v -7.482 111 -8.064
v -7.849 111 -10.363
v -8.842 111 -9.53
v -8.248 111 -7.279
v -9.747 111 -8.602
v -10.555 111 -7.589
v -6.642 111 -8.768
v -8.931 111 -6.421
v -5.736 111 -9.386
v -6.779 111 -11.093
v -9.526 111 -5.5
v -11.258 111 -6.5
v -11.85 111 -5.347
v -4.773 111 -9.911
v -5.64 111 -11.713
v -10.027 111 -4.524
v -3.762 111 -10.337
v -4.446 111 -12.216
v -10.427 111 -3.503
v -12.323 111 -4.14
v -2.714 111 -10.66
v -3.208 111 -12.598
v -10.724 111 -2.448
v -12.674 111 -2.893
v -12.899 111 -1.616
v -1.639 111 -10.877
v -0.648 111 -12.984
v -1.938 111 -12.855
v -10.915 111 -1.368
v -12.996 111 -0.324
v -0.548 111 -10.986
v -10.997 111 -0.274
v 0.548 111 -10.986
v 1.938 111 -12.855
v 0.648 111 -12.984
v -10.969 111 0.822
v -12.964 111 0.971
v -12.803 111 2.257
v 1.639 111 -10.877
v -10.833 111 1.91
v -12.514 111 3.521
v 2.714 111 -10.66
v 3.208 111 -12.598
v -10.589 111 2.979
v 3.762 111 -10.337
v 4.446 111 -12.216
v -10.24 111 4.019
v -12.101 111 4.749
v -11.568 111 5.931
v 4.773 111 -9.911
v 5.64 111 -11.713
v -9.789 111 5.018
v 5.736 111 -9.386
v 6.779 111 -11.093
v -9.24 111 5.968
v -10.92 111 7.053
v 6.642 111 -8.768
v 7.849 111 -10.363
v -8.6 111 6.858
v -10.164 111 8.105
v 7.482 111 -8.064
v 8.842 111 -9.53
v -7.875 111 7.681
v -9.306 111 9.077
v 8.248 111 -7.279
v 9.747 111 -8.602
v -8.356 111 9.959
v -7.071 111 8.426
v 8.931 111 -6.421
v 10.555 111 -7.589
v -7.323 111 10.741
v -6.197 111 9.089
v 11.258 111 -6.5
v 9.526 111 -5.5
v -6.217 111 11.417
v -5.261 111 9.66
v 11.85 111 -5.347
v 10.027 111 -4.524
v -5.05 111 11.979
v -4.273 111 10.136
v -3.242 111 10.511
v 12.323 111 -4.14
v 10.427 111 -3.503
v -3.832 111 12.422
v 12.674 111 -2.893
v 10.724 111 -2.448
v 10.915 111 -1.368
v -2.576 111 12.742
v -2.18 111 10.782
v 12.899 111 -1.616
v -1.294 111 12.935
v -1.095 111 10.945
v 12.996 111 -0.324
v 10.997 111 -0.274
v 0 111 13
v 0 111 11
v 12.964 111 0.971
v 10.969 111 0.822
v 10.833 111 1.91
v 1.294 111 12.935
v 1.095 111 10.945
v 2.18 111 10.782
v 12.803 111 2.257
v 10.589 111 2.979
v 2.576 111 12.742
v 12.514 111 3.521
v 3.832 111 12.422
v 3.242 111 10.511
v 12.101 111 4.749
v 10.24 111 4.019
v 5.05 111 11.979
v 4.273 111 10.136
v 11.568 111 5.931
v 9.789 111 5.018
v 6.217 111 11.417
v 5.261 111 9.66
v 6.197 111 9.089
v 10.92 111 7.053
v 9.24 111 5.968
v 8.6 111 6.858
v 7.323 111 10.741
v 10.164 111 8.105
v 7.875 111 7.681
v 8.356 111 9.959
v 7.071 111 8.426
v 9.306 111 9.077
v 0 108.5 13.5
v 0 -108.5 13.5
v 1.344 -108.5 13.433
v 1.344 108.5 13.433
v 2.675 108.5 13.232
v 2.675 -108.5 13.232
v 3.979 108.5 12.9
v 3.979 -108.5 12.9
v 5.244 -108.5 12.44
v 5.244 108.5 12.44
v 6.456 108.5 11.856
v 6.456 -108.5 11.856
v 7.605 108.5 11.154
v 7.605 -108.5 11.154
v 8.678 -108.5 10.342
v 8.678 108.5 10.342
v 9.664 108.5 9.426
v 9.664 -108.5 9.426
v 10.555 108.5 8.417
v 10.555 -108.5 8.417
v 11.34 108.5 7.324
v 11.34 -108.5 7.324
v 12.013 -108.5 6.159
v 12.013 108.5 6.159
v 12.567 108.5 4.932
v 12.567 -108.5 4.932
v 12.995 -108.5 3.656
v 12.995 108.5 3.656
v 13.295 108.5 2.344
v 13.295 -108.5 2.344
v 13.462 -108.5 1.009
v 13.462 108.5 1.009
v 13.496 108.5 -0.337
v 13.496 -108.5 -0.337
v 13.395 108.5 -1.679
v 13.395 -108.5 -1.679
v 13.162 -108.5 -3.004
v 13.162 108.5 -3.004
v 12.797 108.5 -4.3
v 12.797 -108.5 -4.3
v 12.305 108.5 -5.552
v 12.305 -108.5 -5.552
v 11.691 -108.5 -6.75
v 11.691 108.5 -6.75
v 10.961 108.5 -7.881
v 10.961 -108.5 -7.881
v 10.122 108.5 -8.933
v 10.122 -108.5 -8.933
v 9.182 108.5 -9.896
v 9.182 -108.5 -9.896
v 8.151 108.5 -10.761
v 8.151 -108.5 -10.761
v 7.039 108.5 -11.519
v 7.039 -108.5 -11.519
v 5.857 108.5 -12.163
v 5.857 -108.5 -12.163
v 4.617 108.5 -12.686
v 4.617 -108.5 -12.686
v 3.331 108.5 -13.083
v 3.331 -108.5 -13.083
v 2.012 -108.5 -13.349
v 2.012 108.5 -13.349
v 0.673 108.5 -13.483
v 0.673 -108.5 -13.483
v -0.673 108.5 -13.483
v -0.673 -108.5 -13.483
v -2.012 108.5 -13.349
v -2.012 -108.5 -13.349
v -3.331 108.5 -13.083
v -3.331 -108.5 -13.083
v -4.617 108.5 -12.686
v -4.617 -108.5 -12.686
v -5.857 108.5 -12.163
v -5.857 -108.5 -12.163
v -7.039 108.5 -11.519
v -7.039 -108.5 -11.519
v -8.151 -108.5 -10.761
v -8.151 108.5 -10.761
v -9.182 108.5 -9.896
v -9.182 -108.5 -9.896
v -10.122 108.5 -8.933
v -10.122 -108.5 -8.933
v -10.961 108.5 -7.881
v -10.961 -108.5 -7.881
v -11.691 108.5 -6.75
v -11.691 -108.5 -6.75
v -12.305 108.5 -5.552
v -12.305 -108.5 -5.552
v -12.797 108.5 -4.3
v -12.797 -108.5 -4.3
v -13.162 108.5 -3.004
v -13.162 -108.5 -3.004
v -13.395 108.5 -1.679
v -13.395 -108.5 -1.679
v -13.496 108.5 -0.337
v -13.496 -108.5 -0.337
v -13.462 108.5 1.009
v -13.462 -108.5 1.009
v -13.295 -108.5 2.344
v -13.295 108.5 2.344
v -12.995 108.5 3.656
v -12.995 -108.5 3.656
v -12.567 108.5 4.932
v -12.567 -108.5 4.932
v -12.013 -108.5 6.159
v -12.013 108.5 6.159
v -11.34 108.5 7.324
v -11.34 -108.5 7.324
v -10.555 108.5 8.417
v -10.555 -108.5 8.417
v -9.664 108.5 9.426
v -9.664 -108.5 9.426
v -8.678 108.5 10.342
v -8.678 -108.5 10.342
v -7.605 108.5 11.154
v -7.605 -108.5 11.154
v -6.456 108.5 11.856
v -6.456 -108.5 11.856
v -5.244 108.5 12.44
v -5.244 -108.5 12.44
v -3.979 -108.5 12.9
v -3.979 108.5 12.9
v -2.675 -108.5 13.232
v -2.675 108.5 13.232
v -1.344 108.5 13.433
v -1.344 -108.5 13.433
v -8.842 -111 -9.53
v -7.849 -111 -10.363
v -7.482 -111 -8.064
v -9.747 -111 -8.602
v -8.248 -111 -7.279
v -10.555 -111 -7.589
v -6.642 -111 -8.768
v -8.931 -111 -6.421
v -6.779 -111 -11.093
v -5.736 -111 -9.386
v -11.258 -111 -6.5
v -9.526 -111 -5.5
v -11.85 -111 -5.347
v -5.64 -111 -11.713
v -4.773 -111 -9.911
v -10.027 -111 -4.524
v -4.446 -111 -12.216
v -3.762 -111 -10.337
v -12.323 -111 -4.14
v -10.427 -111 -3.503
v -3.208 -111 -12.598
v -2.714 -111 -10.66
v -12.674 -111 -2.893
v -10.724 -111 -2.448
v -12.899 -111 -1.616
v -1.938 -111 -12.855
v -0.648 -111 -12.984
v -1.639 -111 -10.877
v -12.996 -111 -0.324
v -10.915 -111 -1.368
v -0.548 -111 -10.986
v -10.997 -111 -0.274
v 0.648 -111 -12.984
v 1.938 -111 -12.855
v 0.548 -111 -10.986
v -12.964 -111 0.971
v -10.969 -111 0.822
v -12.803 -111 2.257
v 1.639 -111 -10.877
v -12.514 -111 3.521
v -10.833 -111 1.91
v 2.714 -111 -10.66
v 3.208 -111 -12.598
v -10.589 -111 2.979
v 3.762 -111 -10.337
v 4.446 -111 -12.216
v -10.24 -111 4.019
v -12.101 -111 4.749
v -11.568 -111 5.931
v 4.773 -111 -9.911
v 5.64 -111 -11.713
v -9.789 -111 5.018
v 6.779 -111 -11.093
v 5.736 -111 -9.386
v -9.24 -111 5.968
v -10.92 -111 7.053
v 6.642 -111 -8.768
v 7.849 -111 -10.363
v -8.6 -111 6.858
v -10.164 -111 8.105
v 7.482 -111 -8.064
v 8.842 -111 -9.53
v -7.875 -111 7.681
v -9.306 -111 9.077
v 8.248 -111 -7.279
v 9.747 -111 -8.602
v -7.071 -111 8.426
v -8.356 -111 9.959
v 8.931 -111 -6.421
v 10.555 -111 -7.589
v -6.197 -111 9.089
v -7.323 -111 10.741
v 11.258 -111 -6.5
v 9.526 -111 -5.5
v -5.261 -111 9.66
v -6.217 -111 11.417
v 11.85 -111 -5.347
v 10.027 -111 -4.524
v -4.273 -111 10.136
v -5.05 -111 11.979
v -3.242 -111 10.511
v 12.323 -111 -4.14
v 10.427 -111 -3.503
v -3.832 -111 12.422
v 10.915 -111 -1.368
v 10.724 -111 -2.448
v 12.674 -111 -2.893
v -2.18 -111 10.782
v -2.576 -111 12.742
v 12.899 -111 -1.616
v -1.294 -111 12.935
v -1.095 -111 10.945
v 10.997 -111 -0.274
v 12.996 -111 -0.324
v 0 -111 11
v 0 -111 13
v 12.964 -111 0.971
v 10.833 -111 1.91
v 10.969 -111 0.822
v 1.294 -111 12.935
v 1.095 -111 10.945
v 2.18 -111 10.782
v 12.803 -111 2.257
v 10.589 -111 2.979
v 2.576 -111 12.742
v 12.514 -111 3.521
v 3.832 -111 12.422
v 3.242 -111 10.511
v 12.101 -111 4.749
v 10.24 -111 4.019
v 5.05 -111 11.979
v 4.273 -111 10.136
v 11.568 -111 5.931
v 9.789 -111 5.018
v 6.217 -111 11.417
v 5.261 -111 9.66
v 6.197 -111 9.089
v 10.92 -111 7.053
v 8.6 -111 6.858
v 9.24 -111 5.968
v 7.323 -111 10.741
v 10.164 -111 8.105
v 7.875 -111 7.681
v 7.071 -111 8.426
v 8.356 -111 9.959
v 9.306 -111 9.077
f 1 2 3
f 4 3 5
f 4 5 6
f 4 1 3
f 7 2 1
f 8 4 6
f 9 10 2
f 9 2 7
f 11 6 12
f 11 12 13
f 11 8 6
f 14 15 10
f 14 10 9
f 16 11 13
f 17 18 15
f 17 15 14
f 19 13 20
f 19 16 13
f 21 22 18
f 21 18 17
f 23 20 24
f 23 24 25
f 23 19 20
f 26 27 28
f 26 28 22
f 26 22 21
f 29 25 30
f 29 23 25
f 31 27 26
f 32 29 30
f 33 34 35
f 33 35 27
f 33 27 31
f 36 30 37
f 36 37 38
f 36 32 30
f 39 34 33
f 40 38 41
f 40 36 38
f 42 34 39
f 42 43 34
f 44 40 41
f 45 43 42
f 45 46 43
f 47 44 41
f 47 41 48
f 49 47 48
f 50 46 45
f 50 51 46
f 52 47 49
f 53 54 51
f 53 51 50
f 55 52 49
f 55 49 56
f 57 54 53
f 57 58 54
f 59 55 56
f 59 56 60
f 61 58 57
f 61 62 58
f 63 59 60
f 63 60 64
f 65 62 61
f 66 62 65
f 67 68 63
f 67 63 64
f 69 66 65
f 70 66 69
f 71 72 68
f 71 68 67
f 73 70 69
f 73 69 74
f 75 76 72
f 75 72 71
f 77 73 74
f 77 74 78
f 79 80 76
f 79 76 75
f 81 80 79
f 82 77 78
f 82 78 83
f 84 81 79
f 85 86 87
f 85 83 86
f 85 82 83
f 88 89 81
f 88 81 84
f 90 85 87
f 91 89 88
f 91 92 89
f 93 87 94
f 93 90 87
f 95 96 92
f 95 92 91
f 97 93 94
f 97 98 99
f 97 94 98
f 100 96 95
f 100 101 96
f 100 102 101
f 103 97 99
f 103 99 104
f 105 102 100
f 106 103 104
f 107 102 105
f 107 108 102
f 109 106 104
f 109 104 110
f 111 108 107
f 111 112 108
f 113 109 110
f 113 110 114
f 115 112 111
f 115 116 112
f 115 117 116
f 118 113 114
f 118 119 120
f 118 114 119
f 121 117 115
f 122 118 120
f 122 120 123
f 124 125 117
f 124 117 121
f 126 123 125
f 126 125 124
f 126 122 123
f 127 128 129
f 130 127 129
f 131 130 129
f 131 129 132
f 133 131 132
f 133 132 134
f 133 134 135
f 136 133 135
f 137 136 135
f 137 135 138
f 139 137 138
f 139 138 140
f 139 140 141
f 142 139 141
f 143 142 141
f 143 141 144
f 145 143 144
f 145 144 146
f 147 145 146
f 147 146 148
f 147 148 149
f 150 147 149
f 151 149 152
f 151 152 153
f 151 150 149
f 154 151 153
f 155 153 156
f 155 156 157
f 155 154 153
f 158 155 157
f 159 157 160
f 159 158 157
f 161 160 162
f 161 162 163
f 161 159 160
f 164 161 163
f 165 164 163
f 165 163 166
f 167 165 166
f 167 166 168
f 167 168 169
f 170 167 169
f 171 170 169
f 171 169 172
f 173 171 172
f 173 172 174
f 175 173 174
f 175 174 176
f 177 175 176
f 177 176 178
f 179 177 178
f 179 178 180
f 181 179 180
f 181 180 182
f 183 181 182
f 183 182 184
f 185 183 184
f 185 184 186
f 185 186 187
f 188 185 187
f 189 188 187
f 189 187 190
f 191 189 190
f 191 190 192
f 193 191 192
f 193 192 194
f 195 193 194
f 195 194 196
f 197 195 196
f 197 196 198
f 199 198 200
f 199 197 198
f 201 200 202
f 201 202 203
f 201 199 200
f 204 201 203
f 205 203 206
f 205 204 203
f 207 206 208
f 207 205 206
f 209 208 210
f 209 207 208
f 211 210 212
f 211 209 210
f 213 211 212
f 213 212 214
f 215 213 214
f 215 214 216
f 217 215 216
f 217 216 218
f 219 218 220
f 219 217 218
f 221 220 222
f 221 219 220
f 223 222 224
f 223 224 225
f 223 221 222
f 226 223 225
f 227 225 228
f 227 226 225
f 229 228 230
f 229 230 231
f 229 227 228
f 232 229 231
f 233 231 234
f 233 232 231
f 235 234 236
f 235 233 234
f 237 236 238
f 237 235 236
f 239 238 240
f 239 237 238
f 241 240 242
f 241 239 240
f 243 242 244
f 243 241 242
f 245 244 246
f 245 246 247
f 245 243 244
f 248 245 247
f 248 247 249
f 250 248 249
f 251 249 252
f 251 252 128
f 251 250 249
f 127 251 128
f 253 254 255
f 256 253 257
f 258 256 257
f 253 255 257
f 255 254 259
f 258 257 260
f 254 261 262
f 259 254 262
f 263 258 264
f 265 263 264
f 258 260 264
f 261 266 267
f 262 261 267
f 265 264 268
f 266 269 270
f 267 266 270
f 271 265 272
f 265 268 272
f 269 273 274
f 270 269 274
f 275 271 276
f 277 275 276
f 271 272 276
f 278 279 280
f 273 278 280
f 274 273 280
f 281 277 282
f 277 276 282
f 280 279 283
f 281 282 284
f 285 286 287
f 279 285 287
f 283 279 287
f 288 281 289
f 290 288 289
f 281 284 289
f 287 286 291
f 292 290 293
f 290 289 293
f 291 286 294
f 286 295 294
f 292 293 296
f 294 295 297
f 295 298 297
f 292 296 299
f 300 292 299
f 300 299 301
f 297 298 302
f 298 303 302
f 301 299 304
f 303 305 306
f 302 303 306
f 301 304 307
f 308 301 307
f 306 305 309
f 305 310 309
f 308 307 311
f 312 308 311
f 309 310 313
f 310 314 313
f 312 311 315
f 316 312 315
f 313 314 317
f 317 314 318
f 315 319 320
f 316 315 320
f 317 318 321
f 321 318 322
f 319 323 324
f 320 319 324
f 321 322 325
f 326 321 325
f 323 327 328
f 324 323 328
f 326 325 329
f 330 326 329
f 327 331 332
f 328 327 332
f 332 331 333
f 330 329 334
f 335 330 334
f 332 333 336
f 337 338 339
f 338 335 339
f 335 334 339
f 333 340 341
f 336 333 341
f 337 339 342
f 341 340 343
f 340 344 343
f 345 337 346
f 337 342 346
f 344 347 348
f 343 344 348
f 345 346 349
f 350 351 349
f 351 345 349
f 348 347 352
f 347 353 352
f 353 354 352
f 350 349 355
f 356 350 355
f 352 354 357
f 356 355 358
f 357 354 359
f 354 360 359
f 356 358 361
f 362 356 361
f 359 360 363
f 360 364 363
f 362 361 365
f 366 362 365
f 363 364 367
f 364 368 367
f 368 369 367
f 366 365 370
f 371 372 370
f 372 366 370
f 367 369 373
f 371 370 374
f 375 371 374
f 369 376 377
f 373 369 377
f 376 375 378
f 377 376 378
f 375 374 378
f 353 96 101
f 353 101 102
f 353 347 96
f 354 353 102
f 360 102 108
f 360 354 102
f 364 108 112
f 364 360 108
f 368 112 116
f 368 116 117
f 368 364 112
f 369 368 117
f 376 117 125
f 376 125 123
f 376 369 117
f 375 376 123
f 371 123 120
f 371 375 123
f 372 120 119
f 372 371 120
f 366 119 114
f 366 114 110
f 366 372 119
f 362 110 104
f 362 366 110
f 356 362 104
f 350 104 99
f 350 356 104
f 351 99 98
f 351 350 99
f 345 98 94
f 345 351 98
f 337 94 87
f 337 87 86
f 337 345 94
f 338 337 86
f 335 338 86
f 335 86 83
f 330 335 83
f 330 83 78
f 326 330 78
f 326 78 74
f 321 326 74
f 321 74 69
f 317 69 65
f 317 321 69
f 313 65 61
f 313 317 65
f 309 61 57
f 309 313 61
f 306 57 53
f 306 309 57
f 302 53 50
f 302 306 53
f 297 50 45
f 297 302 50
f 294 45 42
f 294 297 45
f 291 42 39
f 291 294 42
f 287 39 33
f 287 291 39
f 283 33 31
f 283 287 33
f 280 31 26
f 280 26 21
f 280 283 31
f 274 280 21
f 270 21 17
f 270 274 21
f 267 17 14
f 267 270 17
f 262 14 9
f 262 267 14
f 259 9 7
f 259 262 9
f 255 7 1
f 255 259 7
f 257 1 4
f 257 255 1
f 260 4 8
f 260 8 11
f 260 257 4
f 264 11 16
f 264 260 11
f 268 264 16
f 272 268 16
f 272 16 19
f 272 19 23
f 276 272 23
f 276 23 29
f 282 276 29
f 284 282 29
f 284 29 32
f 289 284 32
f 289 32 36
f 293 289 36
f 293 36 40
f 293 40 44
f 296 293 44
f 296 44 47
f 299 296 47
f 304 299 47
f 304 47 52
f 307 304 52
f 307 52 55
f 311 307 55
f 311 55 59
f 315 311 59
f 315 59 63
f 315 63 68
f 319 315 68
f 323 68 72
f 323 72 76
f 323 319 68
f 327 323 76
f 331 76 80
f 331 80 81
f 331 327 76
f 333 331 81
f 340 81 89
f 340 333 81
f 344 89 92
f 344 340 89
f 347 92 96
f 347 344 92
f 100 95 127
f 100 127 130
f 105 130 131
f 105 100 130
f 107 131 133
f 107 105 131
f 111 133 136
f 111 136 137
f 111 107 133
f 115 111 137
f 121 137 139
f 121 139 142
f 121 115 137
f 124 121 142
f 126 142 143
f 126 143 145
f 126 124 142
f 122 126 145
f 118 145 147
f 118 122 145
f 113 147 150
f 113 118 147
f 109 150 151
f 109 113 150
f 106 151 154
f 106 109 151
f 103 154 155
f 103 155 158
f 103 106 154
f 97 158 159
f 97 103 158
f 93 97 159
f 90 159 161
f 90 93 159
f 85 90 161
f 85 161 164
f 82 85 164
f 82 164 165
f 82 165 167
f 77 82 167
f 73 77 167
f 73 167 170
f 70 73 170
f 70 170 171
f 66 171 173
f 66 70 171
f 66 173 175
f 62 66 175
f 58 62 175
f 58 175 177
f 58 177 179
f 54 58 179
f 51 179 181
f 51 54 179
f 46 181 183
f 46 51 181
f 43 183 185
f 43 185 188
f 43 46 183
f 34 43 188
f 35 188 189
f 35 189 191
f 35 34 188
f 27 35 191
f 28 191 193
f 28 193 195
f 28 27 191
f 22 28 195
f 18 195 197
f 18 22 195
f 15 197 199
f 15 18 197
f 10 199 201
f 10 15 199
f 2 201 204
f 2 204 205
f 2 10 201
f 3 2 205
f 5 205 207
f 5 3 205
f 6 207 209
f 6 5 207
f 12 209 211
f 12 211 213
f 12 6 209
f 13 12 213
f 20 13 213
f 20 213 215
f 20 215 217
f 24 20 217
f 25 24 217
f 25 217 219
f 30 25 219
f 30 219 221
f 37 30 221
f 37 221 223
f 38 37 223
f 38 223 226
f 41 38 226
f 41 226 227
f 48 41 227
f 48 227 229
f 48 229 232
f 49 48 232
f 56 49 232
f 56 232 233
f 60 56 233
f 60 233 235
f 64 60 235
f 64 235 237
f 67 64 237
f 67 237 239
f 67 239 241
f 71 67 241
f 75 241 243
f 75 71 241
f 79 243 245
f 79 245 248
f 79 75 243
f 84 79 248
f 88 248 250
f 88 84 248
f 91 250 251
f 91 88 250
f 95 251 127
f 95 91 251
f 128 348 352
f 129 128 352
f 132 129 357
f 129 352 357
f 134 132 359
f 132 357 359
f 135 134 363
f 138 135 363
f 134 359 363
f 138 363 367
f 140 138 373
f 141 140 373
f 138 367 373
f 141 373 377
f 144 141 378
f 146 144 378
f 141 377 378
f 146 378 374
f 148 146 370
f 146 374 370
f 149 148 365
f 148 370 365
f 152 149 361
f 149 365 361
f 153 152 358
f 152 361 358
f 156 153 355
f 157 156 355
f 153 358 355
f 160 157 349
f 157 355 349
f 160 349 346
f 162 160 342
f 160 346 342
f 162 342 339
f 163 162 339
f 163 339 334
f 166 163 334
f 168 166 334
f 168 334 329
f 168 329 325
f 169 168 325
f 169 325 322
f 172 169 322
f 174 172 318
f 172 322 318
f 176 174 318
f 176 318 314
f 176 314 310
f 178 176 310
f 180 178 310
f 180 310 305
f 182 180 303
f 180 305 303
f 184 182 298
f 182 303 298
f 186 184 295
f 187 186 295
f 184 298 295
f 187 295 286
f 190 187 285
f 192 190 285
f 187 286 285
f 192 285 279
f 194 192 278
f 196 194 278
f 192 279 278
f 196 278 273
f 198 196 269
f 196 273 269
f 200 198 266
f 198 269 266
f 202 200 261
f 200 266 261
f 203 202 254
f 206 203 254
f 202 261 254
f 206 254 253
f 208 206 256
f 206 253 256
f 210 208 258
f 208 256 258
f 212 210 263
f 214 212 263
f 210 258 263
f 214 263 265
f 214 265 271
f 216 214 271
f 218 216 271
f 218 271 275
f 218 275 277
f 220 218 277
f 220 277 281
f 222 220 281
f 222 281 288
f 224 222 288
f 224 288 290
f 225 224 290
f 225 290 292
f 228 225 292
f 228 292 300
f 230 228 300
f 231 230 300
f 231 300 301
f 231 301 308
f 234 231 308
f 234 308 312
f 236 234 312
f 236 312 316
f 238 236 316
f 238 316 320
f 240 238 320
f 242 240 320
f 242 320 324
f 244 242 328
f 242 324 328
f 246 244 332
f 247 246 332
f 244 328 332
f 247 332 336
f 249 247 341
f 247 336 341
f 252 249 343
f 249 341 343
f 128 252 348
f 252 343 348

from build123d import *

# Parameters (mm, degrees)
ESQUISSE1_R      = 13.5
ESQUISSE1_R_2    = 11
EXTRUSION1_DEPTH = 111
CHANFREIN1_SIZE  = 2.5
CHANFREIN1_SIZE2 = 0.5
CHANFREIN2_SIZE  = 2.5
CHANFREIN2_SIZE2 = 0.5


with BuildPart() as part:
    # Esquisse1 → Extrusion1 (new body, symmetric)
    with BuildSketch(Plane(origin=(0, 0, 0), x_dir=(1, 0, 0), z_dir=(0, 1, 0))):
        with Locations(Location((0, 0, 0), (0, 0, 270))):  # turned: the seam where the file's is
            Circle(ESQUISSE1_R)
        with Locations(Location((0, 0, 0), (0, 0, 270))):  # turned: the seam where the file's is
            Circle(ESQUISSE1_R_2, mode=Mode.SUBTRACT)
    extrude(amount=EXTRUSION1_DEPTH, both=True)

    # Chanfrein1
    chanfrein1_edges = [part.edges().sort_by_distance(p)[0] for p in [
        (0, -111, -13.5),
    ]]
    chanfrein1_side = [part.faces().sort_by_distance(p)[0] for p in [
        (0, 0, -13.5),
    ]]
    chamfer(chanfrein1_edges, length=CHANFREIN1_SIZE, length2=CHANFREIN1_SIZE2, reference=chanfrein1_side[0])

    # Chanfrein2
    chanfrein2_edges = [part.edges().sort_by_distance(p)[0] for p in [
        (0, 111, -13.5),
    ]]
    chanfrein2_side = [part.faces().sort_by_distance(p)[0] for p in [
        (0, 1.25, -13.5),
    ]]
    chamfer(chanfrein2_edges, length=CHANFREIN2_SIZE, length2=CHANFREIN2_SIZE2, reference=chanfrein2_side[0])


solid = part.part
